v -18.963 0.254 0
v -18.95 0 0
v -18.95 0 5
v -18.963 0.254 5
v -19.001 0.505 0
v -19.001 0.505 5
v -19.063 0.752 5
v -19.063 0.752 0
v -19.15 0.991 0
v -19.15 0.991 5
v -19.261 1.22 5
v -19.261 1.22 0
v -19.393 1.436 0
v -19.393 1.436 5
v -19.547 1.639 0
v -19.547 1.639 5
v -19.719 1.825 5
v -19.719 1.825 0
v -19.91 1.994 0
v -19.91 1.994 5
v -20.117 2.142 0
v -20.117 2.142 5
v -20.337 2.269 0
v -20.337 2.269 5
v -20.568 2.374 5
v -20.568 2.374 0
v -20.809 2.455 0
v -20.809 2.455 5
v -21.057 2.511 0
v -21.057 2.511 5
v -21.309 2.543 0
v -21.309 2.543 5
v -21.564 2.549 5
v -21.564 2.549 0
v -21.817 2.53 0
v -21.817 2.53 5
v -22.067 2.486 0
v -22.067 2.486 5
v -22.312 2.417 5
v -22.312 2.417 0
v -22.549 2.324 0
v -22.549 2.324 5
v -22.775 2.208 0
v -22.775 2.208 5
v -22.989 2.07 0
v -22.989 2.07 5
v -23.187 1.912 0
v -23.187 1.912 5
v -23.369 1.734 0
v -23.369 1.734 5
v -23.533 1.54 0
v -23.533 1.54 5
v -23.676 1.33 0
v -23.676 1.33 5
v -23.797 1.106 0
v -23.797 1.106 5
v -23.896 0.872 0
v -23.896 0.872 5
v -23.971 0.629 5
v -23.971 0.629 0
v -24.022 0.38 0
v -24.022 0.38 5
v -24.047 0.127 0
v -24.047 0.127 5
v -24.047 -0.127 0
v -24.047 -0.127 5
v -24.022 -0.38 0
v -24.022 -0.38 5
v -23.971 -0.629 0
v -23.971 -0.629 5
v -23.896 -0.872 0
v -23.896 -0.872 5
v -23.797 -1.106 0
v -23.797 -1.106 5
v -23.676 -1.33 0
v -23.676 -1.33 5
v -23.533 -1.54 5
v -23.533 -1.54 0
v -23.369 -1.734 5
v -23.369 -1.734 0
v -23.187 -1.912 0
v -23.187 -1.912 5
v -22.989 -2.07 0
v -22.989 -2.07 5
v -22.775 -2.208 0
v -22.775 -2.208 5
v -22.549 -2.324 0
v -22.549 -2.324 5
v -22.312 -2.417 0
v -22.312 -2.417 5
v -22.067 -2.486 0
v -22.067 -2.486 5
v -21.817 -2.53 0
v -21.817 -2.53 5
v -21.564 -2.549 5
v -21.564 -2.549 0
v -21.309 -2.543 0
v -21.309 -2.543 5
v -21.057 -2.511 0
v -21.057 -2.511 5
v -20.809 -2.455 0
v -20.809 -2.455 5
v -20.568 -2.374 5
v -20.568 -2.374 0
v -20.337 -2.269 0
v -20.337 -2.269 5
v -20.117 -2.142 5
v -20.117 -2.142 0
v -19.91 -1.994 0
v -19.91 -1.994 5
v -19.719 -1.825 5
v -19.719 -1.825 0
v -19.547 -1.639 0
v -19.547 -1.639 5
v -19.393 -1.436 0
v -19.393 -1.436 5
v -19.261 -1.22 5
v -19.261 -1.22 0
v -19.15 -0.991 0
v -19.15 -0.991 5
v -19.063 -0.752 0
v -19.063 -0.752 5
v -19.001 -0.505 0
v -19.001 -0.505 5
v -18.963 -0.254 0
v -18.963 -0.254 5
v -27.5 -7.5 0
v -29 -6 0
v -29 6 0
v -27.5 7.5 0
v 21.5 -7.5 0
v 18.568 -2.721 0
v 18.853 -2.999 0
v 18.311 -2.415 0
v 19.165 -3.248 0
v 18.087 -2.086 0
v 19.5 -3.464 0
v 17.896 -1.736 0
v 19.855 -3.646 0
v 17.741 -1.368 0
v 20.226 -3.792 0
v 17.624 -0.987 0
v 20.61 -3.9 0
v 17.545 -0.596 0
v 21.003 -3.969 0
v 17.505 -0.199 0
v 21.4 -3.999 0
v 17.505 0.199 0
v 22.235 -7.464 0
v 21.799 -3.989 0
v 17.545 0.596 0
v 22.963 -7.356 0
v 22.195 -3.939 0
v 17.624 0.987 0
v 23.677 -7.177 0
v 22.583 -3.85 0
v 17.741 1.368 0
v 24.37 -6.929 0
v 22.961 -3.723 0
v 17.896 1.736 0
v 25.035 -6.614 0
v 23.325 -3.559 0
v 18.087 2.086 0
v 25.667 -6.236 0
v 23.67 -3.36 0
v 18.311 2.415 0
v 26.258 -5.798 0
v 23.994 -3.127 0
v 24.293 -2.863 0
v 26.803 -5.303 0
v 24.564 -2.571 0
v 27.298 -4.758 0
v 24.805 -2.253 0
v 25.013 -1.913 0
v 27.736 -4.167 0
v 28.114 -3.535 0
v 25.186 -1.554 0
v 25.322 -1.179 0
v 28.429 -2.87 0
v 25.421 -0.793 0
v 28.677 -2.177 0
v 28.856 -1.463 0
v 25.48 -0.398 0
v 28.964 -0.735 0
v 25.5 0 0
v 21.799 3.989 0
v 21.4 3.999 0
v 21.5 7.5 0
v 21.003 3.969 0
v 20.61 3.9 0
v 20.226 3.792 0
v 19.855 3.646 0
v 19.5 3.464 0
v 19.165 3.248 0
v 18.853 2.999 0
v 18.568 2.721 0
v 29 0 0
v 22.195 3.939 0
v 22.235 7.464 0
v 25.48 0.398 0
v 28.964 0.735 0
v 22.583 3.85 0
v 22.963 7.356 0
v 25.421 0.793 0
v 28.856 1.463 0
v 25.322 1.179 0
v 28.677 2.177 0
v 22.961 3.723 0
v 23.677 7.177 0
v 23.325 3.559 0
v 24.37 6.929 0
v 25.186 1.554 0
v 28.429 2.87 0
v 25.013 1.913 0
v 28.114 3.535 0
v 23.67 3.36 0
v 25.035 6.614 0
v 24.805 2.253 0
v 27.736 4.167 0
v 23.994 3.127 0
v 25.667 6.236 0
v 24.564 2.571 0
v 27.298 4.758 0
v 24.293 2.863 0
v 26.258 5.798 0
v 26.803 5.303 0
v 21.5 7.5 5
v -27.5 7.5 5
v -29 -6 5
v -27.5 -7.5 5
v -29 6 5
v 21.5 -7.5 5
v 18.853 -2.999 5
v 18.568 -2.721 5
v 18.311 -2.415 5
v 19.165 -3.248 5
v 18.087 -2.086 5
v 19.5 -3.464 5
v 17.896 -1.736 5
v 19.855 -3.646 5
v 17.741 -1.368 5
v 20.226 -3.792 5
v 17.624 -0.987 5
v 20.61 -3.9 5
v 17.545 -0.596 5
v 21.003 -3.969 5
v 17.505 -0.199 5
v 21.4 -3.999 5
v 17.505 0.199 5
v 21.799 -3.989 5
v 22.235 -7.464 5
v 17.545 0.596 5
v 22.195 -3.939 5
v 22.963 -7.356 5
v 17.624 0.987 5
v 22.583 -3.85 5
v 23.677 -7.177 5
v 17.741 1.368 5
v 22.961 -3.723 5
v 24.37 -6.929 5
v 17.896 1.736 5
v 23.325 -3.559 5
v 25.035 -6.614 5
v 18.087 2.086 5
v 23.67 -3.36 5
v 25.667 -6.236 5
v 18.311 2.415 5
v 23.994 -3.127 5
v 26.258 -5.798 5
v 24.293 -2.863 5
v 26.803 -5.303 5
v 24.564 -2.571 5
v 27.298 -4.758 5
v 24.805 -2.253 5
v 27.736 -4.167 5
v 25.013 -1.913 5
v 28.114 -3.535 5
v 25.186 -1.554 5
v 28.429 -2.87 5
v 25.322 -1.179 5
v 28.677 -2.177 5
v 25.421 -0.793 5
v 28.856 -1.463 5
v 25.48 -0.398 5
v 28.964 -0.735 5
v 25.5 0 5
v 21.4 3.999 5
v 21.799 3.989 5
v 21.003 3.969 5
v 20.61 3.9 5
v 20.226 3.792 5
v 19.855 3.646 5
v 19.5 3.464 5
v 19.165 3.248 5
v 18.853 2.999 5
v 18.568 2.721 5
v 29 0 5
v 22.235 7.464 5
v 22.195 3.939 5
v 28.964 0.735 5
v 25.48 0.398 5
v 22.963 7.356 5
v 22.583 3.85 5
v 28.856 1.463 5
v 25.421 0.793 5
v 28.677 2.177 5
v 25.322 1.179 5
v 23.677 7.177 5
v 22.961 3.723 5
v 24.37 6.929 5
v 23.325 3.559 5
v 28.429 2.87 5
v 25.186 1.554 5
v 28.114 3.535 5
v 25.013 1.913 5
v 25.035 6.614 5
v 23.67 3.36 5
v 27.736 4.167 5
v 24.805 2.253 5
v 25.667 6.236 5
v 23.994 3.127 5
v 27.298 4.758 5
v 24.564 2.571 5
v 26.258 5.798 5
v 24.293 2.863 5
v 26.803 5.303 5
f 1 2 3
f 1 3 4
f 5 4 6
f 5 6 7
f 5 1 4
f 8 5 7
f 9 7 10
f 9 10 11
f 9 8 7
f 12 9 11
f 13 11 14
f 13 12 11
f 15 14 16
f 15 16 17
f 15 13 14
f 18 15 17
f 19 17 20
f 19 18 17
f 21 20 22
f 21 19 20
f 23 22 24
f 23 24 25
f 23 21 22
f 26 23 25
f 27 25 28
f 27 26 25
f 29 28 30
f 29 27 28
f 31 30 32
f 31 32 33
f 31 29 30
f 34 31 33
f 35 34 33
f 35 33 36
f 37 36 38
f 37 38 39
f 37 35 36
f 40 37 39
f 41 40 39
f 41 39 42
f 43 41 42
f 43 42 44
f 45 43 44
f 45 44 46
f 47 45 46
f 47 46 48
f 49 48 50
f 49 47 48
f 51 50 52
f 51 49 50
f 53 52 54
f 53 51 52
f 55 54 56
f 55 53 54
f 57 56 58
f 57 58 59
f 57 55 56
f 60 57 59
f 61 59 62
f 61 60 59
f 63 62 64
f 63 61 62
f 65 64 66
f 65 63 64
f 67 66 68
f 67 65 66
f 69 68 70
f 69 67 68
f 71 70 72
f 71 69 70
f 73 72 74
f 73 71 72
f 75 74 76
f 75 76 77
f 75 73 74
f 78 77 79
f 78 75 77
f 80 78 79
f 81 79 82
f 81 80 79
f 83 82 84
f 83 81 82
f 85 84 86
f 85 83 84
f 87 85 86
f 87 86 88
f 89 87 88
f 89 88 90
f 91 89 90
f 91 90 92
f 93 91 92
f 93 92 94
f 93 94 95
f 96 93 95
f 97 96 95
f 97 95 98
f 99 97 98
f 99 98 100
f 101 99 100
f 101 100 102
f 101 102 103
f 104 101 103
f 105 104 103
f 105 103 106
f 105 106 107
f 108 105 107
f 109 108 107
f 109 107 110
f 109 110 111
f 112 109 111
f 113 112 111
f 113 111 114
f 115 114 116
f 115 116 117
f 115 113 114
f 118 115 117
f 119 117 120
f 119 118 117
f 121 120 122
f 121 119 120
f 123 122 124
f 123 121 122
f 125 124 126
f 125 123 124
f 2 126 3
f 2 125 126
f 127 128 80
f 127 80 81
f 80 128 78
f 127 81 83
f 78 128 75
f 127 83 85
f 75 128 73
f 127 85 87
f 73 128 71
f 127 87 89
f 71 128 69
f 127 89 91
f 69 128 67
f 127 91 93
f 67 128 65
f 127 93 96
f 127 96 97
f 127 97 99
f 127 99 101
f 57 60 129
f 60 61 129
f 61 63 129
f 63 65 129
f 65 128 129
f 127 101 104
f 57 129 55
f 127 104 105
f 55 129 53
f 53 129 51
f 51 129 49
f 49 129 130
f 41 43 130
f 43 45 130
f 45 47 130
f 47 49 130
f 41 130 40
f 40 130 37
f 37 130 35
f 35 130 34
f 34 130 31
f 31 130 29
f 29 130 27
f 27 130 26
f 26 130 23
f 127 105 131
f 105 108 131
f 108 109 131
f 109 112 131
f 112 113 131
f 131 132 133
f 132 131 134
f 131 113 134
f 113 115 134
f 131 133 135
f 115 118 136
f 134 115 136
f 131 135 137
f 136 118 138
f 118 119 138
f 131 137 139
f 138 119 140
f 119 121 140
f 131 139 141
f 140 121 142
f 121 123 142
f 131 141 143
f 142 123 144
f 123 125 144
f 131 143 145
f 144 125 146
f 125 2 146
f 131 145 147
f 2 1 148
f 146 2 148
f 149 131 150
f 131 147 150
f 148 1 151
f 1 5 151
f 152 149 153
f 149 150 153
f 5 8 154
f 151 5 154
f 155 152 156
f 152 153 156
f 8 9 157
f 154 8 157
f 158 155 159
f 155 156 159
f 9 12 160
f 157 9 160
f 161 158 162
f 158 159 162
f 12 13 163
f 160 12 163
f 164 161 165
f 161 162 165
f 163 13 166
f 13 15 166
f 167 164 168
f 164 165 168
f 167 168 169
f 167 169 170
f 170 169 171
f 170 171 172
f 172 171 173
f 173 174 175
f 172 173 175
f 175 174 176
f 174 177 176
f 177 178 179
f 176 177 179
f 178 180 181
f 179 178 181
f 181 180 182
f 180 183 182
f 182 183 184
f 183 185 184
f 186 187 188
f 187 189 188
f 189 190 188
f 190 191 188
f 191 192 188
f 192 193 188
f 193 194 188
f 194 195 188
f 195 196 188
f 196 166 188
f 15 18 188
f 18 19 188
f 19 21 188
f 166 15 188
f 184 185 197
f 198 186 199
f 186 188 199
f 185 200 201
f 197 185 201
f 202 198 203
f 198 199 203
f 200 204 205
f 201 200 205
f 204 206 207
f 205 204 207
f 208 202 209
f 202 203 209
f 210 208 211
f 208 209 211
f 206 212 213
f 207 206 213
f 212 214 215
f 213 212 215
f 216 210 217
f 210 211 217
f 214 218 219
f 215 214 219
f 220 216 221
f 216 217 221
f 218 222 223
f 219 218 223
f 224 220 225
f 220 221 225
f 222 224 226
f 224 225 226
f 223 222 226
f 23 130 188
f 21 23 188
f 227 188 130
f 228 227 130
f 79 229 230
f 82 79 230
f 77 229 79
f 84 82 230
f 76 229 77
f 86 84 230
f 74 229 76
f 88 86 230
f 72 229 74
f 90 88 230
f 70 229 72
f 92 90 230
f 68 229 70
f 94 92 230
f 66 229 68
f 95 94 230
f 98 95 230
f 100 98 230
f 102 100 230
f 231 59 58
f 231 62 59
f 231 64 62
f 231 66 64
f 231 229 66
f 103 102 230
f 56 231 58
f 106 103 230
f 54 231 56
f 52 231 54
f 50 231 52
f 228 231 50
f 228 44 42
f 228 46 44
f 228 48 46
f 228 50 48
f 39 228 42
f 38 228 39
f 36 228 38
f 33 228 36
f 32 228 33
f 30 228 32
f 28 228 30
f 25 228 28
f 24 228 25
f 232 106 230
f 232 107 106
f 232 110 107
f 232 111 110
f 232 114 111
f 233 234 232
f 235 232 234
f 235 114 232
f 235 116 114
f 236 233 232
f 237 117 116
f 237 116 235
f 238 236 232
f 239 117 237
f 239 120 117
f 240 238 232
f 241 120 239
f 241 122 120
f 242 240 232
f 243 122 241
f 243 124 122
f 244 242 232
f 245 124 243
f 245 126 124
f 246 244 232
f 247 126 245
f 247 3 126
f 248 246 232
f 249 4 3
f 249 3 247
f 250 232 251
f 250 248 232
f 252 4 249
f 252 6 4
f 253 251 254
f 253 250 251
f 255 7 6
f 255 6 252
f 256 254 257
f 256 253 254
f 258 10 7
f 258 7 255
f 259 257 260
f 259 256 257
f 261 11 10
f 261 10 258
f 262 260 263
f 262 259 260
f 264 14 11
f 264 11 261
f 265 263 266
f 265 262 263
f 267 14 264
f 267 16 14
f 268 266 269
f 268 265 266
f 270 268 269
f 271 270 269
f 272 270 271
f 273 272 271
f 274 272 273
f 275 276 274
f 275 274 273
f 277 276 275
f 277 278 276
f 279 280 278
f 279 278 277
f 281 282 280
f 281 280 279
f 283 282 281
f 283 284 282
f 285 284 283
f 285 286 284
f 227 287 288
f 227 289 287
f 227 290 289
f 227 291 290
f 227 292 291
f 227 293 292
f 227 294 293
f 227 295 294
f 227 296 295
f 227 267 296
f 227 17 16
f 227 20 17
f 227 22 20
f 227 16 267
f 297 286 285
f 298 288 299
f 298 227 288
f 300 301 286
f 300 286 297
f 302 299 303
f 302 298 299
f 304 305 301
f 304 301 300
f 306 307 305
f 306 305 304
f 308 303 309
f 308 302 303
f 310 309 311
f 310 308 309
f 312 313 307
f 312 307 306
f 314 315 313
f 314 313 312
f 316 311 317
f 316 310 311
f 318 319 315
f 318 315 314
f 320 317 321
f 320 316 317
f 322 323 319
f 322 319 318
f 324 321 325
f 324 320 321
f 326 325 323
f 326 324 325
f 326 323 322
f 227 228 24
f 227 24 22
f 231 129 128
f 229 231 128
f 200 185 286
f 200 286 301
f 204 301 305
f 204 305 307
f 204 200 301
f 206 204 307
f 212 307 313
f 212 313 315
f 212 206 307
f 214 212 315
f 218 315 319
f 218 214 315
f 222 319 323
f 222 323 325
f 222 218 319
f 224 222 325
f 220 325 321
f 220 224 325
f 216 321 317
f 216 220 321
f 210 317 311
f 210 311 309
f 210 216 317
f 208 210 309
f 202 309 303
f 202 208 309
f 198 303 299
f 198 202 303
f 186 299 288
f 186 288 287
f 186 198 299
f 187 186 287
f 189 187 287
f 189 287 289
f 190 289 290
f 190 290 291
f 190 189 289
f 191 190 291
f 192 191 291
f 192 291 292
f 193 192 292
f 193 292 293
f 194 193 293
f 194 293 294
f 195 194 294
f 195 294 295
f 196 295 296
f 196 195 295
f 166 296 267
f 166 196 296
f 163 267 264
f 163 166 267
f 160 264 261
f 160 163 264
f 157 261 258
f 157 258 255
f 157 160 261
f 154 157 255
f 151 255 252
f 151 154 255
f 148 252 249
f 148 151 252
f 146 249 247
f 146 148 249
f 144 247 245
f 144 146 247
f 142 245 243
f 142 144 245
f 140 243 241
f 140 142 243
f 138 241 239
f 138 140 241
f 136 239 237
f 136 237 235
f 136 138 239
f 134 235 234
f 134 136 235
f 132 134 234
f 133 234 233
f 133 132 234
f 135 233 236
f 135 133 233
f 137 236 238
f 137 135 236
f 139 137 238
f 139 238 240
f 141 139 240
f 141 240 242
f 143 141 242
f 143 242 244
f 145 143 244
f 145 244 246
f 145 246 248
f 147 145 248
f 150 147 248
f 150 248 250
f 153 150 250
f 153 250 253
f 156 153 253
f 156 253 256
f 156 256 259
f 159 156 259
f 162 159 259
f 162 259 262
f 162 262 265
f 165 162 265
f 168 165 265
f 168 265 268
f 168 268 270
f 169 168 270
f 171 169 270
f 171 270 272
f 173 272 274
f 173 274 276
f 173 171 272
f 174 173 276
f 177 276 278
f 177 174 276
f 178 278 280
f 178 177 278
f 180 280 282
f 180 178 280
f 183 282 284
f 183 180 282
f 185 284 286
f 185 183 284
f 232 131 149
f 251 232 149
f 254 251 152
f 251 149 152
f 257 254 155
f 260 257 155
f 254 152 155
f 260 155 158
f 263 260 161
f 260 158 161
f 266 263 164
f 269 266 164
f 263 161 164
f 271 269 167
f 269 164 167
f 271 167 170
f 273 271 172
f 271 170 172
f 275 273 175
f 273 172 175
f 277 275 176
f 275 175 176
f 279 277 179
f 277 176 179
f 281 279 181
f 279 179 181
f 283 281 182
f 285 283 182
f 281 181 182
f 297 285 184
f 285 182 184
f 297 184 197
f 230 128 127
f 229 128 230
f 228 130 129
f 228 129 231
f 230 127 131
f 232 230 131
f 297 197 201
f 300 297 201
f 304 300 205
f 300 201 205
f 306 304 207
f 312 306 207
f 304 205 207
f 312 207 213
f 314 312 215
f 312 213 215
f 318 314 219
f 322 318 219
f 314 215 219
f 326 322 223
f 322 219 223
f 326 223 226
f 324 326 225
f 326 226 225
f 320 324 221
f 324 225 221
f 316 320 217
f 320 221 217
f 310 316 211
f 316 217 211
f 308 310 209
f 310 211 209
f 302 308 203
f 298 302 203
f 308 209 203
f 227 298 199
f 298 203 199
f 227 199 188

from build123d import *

# Parameters (mm, degrees)
F0_R     = 2.55
F0_R_2   = 4
F1_DEPTH = 5
F2_SIZE  = 1.5


with BuildPart() as f1:
    # F0 (on Top) → F1 (new body)
    with BuildSketch(Plane.XY):
        with BuildLine():
            Line((-29, -7.5), (21.5, -7.5))
            ThreePointArc((21.5, -7.5), (26.803301, -5.303301), (29, 0))
            ThreePointArc((29, 0), (26.803301, 5.303301), (21.5, 7.5))
            Line((21.5, 7.5), (-29, 7.5))
            Line((-29, 7.5), (-29, -7.5))
        make_face()
        with Locations((-21.5, 0)):
            Circle(F0_R, mode=Mode.SUBTRACT)
        with Locations((21.5, 0)):
            Circle(F0_R_2, mode=Mode.SUBTRACT)
    extrude(amount=F1_DEPTH)

    # F2
    f2_edges = [f1.edges().sort_by_distance(p)[0] for p in [
        (-29, 7.5, 2.5),
        (-29, -7.5, 2.5),
    ]]
    chamfer(f2_edges, length=F2_SIZE)


solid = f1.part
